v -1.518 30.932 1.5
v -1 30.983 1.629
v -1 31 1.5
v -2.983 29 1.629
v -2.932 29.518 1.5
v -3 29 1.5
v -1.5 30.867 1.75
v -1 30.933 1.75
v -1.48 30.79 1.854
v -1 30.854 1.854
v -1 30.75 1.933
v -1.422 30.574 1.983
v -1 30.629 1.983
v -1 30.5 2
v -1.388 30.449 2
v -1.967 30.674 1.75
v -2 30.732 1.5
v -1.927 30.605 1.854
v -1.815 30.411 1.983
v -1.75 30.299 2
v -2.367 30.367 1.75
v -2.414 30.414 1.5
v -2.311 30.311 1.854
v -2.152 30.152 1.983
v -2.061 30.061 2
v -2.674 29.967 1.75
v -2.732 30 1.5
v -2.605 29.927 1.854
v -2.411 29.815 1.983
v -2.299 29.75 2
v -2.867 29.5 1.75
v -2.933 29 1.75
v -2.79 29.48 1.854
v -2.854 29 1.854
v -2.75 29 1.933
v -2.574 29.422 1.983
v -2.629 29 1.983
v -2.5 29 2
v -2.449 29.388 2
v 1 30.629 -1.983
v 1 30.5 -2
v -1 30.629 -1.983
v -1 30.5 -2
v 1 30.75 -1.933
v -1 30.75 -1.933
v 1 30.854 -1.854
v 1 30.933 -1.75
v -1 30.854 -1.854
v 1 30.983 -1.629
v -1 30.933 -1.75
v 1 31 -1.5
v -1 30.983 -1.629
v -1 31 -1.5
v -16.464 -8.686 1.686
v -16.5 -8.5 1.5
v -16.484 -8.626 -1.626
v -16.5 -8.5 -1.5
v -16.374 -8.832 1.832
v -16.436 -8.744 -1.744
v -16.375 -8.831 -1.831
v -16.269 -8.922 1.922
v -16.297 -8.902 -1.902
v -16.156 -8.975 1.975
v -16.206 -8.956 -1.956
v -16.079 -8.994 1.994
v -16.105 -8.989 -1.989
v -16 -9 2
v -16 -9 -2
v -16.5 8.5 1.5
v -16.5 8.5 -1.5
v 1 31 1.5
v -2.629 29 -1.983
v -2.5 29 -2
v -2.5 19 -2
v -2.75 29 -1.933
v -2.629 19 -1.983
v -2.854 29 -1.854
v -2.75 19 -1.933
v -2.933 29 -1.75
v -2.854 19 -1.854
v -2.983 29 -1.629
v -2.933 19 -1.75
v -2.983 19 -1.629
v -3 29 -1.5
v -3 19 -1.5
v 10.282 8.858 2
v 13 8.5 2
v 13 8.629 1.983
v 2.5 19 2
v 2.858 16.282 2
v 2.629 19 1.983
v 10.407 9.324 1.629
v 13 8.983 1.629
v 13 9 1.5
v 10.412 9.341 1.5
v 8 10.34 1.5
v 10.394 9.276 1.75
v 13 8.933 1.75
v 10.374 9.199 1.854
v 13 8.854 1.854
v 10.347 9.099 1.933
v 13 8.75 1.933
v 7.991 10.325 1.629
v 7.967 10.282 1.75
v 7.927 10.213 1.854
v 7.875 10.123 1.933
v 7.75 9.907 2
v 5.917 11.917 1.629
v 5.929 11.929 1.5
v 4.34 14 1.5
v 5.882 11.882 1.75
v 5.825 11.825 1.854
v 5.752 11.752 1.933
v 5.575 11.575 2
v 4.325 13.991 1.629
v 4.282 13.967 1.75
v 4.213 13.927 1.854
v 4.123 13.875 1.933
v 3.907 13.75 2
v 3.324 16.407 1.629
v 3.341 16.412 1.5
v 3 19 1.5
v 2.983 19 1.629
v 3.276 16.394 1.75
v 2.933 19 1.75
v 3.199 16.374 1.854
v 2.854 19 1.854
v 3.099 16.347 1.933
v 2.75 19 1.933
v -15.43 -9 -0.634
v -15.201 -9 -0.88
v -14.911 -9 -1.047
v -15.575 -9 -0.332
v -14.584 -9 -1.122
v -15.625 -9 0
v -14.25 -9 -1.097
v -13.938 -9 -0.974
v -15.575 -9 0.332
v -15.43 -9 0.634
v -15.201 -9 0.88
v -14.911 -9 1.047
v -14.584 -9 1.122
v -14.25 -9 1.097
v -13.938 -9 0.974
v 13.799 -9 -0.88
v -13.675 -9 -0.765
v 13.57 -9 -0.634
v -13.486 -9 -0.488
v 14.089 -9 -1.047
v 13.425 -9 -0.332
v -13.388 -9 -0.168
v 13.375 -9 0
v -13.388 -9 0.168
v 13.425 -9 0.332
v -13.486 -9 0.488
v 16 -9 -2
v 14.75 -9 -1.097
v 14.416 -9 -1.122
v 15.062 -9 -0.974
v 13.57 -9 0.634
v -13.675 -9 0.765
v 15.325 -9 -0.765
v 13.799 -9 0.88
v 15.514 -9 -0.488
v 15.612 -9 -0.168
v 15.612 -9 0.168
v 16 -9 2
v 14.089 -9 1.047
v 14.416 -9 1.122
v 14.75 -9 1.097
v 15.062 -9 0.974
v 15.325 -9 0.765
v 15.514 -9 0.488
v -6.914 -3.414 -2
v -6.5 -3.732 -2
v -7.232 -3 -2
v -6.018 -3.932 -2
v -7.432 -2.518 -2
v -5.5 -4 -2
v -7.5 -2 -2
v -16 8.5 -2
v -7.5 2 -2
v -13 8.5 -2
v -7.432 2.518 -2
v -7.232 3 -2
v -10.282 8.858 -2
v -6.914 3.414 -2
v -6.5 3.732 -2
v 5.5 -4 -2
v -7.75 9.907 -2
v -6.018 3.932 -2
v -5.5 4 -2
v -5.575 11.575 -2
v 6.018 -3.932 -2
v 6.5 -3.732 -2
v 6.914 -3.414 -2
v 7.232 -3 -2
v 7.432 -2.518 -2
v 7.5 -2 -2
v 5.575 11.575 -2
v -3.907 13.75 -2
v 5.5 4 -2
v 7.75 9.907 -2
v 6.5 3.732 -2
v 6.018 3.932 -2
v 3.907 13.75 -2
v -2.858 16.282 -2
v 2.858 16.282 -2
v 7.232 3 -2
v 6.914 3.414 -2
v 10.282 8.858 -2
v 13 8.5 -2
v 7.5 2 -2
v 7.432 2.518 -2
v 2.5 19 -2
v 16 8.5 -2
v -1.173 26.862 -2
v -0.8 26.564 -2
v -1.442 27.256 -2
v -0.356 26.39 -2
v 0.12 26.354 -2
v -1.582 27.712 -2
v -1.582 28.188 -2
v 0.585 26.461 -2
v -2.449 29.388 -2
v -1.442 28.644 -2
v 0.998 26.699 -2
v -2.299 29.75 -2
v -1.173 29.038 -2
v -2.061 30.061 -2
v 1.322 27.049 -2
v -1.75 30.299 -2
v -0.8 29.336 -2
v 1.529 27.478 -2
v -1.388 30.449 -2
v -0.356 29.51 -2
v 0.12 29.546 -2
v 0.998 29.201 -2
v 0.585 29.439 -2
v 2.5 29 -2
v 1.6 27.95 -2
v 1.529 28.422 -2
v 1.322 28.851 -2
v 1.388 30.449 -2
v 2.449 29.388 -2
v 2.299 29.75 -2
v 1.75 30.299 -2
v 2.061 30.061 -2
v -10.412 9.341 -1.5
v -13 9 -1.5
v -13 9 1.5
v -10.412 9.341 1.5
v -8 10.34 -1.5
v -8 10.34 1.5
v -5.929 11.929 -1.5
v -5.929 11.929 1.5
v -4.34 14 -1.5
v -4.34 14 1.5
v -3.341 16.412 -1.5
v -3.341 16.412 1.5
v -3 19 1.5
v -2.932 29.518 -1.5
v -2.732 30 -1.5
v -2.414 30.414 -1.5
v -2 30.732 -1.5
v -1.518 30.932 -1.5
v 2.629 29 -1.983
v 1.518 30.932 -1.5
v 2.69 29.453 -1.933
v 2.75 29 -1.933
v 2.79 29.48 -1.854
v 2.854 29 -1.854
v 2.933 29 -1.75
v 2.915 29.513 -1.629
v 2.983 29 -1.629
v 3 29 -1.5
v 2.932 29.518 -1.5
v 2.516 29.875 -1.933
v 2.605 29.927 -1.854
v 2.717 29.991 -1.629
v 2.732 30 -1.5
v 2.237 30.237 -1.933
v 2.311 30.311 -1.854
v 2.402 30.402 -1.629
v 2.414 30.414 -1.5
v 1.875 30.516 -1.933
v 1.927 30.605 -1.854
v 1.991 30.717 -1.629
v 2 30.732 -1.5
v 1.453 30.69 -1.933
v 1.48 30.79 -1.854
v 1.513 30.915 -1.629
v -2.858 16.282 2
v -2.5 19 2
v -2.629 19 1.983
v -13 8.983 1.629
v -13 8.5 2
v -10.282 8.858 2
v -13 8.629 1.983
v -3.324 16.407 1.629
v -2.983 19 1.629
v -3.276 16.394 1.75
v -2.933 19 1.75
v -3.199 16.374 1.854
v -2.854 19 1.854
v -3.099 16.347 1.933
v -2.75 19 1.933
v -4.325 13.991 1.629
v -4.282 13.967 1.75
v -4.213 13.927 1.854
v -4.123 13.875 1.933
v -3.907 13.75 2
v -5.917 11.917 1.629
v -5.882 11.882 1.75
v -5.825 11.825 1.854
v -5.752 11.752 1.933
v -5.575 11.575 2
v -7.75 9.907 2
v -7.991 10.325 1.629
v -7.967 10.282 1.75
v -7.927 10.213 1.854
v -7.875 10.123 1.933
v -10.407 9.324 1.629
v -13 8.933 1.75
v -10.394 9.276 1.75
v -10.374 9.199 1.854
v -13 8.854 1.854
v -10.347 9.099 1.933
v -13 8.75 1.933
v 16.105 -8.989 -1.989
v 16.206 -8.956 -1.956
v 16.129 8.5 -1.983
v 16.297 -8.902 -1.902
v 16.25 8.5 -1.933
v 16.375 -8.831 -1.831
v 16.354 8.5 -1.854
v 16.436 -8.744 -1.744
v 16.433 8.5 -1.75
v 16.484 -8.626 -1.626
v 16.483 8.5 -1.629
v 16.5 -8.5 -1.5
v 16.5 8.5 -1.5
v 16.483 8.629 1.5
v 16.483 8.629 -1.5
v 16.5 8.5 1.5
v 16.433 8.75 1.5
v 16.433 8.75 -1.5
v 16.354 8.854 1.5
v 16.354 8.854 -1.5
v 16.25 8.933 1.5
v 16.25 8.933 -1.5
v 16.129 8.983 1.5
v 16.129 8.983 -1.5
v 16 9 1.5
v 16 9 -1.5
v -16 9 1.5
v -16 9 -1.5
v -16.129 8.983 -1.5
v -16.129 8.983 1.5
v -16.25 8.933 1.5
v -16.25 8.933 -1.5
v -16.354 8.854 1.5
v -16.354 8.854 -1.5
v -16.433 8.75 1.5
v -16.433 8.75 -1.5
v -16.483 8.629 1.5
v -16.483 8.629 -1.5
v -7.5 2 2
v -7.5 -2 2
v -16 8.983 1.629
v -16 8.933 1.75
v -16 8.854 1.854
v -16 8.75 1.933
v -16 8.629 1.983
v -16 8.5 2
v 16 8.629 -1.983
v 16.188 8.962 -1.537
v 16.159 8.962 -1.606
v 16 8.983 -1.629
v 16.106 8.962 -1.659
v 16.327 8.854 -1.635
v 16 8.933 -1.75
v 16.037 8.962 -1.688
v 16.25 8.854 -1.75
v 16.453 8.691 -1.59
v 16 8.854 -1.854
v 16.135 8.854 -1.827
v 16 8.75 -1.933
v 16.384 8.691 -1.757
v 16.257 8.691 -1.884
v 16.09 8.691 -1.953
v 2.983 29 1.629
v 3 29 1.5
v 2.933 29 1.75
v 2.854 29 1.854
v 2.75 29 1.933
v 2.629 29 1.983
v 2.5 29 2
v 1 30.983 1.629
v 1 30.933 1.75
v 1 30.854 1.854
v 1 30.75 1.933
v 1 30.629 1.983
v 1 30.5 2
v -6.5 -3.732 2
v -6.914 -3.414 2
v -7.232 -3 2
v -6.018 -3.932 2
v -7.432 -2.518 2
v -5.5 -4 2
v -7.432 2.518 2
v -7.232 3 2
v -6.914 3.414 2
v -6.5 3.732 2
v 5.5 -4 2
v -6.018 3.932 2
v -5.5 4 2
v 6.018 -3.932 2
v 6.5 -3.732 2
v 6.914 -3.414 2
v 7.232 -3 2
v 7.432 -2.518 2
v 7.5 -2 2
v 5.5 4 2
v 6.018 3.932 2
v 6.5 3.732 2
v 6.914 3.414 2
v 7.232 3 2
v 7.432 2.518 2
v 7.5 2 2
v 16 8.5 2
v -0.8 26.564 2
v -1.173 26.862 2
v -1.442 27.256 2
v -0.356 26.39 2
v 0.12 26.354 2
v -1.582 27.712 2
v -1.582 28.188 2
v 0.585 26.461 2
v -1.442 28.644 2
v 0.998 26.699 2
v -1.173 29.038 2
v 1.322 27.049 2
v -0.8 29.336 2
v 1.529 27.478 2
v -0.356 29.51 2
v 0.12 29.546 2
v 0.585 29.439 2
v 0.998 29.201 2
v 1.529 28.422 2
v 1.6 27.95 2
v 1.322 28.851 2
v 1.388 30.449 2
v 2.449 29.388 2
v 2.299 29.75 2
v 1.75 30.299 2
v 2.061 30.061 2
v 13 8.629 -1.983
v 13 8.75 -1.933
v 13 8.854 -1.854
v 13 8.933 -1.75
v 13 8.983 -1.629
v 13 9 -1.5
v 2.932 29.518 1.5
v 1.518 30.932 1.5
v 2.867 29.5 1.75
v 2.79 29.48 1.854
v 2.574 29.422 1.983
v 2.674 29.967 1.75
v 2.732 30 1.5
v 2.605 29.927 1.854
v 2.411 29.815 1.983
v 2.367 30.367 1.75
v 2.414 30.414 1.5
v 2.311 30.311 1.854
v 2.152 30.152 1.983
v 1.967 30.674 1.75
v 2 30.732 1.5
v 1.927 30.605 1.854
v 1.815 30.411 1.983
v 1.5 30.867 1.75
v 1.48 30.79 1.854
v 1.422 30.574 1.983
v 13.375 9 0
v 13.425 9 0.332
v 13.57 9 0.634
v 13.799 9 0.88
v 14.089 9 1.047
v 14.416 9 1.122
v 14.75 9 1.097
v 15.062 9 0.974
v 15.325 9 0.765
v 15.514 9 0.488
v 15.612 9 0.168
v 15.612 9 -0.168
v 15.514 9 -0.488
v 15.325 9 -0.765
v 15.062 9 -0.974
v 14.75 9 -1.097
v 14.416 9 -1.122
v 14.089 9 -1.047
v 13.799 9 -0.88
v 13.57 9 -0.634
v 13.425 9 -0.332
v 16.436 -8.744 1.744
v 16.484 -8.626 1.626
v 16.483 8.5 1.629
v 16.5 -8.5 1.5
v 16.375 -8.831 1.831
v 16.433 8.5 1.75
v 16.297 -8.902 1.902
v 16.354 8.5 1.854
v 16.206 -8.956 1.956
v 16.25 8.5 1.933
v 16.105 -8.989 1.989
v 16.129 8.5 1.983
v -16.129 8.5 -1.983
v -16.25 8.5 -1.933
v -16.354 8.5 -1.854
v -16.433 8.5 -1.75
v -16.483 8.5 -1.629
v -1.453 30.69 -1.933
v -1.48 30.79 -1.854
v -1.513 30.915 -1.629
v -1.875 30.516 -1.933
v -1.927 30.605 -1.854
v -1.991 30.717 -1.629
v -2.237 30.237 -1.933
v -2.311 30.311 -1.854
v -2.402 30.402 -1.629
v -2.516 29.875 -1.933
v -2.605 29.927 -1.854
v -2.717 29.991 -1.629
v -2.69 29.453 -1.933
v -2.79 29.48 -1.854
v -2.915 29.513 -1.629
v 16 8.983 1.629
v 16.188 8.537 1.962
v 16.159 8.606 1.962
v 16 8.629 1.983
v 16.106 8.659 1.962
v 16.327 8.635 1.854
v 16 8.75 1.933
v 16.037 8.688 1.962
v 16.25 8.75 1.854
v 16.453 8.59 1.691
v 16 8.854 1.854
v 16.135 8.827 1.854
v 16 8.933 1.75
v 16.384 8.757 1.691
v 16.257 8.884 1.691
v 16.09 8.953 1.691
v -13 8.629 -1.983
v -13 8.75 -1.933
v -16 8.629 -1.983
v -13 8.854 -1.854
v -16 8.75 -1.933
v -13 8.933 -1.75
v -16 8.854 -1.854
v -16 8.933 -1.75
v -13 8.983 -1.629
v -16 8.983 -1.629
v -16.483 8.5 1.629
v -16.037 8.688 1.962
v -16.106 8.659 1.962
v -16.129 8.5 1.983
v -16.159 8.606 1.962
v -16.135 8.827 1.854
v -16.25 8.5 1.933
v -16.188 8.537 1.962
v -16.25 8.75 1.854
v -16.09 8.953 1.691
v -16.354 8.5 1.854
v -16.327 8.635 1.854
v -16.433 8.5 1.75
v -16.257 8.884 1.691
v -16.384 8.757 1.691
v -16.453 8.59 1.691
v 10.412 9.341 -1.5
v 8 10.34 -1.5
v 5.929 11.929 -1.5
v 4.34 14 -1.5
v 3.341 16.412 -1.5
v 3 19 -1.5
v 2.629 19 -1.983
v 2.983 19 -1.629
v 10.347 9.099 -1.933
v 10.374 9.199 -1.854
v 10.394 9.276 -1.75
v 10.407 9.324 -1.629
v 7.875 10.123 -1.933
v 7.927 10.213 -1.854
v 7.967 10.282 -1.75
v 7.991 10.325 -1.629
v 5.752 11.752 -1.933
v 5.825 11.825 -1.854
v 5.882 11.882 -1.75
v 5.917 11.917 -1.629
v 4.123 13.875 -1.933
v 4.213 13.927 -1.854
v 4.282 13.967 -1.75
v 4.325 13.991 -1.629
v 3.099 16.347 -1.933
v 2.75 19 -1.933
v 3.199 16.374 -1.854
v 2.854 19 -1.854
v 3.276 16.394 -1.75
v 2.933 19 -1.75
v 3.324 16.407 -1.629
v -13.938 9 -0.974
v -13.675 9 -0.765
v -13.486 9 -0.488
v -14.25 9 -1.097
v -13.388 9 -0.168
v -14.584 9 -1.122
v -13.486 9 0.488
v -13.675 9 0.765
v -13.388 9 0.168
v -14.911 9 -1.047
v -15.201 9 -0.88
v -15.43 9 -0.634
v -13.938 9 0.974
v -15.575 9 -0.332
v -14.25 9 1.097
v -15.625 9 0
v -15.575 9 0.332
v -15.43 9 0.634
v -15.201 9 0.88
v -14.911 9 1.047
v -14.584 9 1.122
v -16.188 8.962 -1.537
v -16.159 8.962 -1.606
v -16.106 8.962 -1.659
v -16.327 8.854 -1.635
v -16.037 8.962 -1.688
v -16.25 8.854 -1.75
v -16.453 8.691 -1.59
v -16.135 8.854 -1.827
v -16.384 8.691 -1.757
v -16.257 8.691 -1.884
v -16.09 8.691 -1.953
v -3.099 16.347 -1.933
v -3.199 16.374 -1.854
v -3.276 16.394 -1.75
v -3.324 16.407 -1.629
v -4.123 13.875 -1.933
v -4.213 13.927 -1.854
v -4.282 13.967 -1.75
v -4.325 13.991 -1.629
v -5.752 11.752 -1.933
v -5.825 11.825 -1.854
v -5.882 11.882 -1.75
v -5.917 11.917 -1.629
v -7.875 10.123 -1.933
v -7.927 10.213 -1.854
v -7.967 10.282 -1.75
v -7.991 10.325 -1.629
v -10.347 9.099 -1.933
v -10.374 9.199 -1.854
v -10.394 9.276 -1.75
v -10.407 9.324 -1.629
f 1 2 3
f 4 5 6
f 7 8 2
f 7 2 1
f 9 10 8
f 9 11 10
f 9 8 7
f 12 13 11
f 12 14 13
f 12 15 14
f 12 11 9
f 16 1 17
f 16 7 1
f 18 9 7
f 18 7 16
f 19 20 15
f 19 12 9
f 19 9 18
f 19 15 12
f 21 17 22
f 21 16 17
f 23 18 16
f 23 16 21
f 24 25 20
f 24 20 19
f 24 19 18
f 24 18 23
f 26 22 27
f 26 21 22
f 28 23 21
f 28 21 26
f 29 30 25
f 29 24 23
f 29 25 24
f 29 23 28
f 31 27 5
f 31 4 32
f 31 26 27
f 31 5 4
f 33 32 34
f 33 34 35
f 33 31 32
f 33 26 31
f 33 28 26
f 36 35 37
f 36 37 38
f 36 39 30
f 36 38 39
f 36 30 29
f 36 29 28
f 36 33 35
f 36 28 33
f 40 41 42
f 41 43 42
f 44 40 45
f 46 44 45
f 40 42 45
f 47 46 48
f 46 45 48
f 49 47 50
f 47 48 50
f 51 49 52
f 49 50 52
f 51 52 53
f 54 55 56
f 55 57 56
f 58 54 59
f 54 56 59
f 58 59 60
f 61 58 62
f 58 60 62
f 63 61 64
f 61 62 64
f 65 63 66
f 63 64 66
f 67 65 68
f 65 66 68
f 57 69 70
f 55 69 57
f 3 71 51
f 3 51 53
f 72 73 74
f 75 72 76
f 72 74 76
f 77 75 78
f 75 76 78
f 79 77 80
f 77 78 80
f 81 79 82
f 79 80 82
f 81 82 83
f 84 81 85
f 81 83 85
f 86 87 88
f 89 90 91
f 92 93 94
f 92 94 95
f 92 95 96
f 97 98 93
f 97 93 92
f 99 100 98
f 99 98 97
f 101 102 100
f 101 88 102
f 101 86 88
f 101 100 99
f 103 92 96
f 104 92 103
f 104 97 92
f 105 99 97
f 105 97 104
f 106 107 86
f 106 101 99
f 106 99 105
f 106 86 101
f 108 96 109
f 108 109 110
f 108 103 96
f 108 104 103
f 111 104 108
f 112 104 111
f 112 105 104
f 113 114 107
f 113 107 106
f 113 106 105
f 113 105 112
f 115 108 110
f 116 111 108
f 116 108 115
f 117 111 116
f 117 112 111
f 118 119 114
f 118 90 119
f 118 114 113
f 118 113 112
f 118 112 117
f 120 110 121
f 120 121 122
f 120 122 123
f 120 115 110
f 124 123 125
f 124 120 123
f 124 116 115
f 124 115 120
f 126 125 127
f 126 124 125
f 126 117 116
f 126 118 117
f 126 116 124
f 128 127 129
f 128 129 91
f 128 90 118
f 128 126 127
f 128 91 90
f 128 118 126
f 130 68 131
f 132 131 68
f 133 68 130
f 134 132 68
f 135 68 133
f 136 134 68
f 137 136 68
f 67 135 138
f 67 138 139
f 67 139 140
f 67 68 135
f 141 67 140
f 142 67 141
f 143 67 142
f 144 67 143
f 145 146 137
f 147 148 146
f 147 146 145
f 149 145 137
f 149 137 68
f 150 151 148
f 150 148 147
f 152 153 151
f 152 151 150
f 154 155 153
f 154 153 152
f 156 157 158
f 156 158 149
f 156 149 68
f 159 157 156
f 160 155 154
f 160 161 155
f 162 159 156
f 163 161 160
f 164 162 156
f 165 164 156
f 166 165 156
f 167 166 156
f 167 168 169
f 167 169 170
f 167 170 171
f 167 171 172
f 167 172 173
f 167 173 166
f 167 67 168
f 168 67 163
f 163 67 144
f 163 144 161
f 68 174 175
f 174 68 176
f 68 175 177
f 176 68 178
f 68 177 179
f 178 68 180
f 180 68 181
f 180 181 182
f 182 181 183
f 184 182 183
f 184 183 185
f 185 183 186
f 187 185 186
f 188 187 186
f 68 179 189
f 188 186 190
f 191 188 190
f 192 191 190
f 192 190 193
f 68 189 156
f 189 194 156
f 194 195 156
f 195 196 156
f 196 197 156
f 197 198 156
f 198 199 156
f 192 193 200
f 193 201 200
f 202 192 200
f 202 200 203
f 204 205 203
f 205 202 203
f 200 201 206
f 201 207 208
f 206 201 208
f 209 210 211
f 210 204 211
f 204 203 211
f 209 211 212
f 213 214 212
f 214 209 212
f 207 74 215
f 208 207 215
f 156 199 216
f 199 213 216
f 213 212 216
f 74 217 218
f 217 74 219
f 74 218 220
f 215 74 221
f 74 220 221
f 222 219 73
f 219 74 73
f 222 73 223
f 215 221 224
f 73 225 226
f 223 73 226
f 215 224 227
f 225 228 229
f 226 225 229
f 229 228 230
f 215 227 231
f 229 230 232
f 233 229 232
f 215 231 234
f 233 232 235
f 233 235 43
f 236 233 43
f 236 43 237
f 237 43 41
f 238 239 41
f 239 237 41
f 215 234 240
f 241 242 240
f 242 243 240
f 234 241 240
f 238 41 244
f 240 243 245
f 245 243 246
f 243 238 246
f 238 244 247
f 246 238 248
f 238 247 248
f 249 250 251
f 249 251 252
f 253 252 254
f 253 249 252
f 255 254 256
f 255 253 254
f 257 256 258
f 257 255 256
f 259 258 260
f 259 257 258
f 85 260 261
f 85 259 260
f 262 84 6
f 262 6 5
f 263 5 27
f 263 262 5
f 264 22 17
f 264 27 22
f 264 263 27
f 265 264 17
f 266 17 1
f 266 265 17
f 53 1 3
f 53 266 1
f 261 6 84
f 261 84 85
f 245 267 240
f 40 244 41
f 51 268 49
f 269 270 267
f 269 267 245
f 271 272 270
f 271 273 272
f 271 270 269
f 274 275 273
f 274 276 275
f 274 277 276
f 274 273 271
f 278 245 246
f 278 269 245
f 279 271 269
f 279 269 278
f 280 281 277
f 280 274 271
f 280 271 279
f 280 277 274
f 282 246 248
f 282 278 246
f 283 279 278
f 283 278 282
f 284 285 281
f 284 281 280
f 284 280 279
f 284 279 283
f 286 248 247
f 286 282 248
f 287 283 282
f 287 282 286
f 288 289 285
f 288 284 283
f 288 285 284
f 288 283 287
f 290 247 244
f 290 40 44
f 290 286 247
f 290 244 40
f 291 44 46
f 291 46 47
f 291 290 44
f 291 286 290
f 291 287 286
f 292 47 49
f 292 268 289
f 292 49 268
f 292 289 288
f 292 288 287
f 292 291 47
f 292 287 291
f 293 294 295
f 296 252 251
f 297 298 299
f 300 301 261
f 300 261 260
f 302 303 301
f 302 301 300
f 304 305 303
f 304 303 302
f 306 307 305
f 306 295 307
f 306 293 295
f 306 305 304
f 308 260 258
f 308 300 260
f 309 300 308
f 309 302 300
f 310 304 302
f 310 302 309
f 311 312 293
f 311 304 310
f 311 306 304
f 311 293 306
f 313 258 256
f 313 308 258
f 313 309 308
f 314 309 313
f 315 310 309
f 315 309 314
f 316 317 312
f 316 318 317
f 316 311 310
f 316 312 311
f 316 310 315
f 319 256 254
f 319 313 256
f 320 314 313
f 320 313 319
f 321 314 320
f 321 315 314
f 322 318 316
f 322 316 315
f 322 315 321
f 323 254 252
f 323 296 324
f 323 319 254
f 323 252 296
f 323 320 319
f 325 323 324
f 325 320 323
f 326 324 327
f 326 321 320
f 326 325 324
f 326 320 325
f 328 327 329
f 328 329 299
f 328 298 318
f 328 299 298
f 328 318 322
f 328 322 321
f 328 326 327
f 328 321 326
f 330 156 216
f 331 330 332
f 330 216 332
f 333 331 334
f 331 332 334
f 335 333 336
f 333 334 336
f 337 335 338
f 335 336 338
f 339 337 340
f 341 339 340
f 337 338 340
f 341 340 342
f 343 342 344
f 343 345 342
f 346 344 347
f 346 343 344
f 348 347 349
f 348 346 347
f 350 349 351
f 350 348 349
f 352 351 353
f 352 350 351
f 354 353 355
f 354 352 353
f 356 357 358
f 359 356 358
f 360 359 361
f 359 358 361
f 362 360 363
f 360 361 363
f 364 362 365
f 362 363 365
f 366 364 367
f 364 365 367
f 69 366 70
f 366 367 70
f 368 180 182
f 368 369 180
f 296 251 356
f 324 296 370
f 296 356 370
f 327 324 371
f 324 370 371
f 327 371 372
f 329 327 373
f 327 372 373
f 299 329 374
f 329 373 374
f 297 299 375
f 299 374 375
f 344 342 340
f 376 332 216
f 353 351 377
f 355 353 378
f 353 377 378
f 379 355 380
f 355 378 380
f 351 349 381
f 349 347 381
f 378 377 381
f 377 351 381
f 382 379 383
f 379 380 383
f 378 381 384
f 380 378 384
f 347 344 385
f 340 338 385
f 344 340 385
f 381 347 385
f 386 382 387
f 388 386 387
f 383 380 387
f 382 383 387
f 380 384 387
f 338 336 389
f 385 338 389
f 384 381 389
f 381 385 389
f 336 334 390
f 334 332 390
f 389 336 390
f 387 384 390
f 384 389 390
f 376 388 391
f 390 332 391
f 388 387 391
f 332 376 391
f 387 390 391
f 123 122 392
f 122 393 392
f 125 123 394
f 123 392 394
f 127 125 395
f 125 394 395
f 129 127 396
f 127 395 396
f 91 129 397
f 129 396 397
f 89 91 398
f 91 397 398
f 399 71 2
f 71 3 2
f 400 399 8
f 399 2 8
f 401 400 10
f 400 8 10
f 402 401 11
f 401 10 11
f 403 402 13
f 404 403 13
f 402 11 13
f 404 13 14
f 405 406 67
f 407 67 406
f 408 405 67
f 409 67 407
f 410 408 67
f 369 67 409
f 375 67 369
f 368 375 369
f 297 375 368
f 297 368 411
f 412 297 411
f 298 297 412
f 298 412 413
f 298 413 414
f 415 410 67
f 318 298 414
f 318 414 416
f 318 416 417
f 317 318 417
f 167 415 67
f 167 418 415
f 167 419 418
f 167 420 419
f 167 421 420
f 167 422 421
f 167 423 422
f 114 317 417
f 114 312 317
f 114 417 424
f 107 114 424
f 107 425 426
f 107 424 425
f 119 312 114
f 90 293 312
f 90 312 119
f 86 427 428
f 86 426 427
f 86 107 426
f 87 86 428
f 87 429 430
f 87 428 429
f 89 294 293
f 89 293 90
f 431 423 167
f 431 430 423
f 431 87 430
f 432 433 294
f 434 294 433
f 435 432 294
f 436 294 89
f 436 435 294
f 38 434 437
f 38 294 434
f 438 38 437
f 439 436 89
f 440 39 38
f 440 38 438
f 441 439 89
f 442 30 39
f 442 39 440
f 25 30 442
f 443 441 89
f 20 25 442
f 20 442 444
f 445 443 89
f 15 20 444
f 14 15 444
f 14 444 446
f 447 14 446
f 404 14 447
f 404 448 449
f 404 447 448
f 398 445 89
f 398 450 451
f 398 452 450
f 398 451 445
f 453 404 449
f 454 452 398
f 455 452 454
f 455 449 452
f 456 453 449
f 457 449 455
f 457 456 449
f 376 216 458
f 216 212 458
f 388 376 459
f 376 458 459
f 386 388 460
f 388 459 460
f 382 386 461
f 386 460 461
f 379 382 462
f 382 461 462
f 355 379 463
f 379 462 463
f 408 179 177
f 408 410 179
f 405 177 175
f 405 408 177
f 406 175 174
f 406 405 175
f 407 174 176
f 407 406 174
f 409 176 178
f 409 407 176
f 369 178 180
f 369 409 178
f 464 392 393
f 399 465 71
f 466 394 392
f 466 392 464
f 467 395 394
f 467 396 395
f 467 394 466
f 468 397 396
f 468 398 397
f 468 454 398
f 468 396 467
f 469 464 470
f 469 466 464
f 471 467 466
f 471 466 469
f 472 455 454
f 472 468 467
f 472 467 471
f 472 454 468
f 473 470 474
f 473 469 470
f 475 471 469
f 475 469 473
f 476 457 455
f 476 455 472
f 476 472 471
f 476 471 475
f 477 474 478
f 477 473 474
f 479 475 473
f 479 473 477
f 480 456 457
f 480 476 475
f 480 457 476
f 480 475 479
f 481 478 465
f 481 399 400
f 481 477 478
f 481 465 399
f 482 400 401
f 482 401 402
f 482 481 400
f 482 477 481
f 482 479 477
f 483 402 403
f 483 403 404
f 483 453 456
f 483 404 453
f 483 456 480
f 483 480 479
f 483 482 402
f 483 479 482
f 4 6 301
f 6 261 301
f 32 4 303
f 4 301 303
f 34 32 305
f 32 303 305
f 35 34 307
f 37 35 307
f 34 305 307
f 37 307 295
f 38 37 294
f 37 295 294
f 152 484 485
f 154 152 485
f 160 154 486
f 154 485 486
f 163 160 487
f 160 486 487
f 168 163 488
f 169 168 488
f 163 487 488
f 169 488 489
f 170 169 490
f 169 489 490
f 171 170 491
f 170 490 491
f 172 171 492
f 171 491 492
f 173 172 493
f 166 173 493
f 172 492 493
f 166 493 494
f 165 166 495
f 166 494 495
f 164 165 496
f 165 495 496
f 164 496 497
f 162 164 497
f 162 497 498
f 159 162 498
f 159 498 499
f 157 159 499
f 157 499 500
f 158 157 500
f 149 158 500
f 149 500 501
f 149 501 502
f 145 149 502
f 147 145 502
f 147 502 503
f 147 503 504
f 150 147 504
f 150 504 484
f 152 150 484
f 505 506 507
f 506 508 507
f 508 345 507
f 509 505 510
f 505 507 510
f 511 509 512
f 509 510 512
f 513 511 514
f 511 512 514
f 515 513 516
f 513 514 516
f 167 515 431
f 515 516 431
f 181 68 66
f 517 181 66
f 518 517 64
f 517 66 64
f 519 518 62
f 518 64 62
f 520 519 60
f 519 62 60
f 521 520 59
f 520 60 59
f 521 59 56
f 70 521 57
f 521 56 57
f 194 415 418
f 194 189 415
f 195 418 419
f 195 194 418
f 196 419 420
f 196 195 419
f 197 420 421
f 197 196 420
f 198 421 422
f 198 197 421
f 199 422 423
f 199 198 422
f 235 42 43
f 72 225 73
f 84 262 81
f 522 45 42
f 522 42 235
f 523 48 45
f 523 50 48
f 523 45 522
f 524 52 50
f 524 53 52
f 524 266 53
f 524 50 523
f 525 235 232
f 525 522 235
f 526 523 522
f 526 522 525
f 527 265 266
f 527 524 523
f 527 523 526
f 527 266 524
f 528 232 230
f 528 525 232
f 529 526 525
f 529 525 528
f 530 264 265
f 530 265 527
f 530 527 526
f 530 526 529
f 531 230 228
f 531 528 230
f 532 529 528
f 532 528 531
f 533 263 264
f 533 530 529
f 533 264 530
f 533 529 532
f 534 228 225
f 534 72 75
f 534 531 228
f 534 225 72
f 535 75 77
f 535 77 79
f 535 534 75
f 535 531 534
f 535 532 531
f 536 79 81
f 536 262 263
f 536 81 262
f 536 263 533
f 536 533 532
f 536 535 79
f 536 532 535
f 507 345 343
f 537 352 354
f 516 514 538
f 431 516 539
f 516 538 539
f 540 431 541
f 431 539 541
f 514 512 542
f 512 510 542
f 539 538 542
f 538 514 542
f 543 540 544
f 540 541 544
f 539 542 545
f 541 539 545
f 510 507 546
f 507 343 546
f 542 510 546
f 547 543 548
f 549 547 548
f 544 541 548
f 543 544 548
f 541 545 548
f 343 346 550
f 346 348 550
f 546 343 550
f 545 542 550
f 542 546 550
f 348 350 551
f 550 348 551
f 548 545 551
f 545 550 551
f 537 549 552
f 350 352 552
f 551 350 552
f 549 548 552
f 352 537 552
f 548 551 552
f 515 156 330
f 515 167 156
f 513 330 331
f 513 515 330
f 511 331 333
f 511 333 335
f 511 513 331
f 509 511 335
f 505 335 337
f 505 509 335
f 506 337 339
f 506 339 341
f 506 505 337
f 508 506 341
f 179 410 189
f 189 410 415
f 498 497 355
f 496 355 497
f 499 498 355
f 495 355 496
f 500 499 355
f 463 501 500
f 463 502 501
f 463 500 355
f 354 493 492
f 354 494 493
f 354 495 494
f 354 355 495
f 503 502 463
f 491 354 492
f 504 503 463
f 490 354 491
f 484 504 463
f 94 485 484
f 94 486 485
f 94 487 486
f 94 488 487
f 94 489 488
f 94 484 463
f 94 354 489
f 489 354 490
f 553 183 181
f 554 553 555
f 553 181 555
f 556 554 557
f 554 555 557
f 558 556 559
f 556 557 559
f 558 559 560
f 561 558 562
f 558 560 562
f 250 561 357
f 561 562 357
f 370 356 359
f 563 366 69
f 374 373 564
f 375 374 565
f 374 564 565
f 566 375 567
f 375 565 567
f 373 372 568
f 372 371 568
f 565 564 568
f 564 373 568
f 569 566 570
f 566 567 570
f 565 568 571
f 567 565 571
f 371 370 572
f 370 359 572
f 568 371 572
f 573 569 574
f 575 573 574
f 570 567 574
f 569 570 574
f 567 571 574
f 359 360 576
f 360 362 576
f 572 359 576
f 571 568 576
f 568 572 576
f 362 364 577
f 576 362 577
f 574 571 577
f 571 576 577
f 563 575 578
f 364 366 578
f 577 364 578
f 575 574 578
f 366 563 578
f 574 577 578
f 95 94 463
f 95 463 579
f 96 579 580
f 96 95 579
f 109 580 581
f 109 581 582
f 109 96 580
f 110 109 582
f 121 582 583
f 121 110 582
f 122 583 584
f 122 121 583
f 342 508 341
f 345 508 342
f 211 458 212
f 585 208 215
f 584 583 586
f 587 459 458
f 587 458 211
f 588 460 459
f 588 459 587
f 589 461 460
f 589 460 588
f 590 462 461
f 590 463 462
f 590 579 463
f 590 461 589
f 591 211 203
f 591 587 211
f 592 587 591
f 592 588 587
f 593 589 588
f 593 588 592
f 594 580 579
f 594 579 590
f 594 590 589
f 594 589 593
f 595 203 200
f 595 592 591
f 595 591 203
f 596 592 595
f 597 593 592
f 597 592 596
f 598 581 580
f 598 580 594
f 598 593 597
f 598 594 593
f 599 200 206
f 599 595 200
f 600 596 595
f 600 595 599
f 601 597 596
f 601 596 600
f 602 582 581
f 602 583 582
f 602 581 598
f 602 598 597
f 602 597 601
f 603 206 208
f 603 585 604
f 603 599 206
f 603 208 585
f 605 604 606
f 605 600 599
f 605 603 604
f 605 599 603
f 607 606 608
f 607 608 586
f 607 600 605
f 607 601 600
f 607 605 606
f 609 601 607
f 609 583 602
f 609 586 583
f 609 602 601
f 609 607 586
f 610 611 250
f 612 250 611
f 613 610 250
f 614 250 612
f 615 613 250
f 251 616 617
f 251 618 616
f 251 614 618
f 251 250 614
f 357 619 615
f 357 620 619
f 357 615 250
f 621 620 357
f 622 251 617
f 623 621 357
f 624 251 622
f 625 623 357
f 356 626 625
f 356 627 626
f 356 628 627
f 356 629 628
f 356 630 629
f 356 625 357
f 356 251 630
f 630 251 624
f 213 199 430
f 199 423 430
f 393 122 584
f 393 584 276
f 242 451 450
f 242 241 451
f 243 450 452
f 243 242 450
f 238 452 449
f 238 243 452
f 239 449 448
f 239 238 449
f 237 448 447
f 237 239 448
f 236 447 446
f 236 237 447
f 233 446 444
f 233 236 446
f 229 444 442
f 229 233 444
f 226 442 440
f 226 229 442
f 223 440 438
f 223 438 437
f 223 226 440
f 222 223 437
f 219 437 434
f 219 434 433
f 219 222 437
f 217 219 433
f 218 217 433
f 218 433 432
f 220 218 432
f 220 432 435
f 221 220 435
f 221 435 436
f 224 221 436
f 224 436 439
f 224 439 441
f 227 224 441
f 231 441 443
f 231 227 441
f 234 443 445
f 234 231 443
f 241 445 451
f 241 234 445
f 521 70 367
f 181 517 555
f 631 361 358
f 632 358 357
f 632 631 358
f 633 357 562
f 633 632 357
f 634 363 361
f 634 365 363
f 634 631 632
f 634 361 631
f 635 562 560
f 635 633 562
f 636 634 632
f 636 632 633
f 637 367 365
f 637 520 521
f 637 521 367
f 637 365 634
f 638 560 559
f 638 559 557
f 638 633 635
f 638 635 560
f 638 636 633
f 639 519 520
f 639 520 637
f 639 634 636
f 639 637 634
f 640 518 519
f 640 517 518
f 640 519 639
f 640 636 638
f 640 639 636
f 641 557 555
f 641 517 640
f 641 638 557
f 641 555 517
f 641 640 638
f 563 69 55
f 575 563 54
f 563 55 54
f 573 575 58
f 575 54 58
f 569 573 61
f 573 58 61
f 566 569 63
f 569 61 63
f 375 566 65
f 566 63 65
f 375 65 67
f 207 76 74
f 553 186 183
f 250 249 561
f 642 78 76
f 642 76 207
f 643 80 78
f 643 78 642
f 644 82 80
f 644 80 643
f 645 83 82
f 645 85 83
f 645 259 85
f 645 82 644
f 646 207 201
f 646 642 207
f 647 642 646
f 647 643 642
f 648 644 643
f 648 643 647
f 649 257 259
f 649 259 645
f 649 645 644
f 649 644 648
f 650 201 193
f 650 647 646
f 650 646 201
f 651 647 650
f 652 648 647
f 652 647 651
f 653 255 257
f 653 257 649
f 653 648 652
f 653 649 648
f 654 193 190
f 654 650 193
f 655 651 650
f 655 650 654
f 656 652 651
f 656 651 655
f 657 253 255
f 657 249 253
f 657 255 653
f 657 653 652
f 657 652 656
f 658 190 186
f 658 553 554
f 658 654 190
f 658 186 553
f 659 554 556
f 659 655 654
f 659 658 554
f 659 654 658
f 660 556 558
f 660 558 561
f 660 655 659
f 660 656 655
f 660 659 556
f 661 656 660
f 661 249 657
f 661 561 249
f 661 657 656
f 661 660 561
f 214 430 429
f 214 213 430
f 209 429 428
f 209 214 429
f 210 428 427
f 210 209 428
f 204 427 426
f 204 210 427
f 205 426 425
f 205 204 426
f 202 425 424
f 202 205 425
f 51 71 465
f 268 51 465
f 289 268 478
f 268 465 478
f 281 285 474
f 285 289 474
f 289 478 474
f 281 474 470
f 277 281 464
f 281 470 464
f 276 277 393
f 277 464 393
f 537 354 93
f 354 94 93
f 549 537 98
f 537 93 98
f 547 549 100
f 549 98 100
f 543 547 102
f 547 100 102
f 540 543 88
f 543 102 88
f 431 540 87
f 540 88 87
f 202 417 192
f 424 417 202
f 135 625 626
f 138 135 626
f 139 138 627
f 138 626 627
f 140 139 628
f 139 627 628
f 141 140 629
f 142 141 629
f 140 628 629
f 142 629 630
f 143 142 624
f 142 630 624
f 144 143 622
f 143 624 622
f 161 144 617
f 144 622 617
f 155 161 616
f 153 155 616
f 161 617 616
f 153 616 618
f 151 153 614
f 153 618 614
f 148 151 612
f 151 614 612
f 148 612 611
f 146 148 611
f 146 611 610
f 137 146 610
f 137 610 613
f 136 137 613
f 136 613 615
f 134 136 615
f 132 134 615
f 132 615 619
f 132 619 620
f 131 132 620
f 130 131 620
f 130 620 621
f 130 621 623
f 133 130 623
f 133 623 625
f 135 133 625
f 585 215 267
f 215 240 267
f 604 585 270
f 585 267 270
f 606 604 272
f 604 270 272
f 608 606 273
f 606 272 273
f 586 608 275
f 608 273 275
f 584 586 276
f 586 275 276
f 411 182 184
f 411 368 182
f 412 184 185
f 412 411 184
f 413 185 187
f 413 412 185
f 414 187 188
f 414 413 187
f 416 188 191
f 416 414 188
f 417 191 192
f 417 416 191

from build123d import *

# Parameters (mm, degrees)
SKETCH1_W           = 15
SKETCH1_H           = 8
SKETCH1_R           = 1.6
BOSS_EXTRUDE1_DEPTH = 2
SKETCH2_R           = 1.125
CUT_EXTRUDE1_DEPTH  = 28.572631358
FILLET2_R           = 10
FILLET3_R           = 2
FILLET6_R           = 2
FILLET5_R           = 0.5


with BuildPart() as part:
    # Sketch1 → Boss-Extrude1 (new, symmetric)
    with BuildSketch(Plane.XY):
        Polygon((-16.5, -9), (16.5, -9), (16.5, 9), (3, 9), (3, 31), (-3, 31), (-3, 9), (-16.5, 9), align=None)
        Rectangle(SKETCH1_W, SKETCH1_H, mode=Mode.SUBTRACT)
        with Locations((0, 27.95)):
            Circle(SKETCH1_R, mode=Mode.SUBTRACT)
    extrude(amount=BOSS_EXTRUDE1_DEPTH, both=True)

    # Sketch2 → Cut-Extrude1 (cut, through all)
    with BuildSketch(Plane(origin=(0, 9, 0), x_dir=(1, 0, 0), z_dir=(0, 1, 0))):
        with Locations(Location((-14.5, 0, 0), (0, 0, 180))):
            Circle(SKETCH2_R)
        with Locations(Location((14.5, 0, 0), (0, 0, 180))):
            Circle(SKETCH2_R)
    extrude(amount=-CUT_EXTRUDE1_DEPTH, mode=Mode.SUBTRACT)

    # Fillet2
    fillet2_edges = [part.edges().sort_by_distance(p)[0] for p in [
        (-3, 9, 0),
        (3, 9, 0),
    ]]
    fillet(fillet2_edges, radius=FILLET2_R)

    # Fillet3
    fillet3_edges = [part.edges().sort_by_distance(p)[0] for p in [
        (-3, 31, 0),
        (3, 31, 0),
    ]]
    fillet(fillet3_edges, radius=FILLET3_R)

    # Fillet6
    fillet6_edges = [part.edges().sort_by_distance(p)[0] for p in [
        (-7.5, 4, 0),
        (-7.5, -4, 0),
        (7.5, -4, 0),
        (7.5, 4, 0),
    ]]
    fillet(fillet6_edges, radius=FILLET6_R)

    # Fillet5
    fillet5_edges = [part.edges().sort_by_distance(p)[0] for p in [
        (16.5, 0, -2),
        (-16.5, 0, -2),
        (16.5, 9, 0),
        (16.5, -9, 0),
        (-16.5, -9, 0),
        (-16.5, 9, 0),
        (16.5, 0, 2),
        (14.75, 9, 2),
        (-14.75, 9, -2),
        (-14.75, 9, 2),
        (3, 24, -2),
        (3, 24, 2),
        (-5.928932188, 11.928932188, -2),
        (-5.928932188, 11.928932188, 2),
        (5.928932188, 11.928932188, -2),
        (5.928932188, 11.928932188, 2),
        (0, 31, -2),
        (0, 31, 2),
        (-3, 24, -2),
        (-2.414213562, 30.414213562, -2),
        (2.414213562, 30.414213562, -2),
        (-3, 24, 2),
        (-2.414213562, 30.414213562, 2),
        (2.414213562, 30.414213562, 2),
        (-16.5, 0, 2),
        (14.75, 9, -2),
    ]]
    fillet(fillet5_edges, radius=FILLET5_R)


solid = part.part
